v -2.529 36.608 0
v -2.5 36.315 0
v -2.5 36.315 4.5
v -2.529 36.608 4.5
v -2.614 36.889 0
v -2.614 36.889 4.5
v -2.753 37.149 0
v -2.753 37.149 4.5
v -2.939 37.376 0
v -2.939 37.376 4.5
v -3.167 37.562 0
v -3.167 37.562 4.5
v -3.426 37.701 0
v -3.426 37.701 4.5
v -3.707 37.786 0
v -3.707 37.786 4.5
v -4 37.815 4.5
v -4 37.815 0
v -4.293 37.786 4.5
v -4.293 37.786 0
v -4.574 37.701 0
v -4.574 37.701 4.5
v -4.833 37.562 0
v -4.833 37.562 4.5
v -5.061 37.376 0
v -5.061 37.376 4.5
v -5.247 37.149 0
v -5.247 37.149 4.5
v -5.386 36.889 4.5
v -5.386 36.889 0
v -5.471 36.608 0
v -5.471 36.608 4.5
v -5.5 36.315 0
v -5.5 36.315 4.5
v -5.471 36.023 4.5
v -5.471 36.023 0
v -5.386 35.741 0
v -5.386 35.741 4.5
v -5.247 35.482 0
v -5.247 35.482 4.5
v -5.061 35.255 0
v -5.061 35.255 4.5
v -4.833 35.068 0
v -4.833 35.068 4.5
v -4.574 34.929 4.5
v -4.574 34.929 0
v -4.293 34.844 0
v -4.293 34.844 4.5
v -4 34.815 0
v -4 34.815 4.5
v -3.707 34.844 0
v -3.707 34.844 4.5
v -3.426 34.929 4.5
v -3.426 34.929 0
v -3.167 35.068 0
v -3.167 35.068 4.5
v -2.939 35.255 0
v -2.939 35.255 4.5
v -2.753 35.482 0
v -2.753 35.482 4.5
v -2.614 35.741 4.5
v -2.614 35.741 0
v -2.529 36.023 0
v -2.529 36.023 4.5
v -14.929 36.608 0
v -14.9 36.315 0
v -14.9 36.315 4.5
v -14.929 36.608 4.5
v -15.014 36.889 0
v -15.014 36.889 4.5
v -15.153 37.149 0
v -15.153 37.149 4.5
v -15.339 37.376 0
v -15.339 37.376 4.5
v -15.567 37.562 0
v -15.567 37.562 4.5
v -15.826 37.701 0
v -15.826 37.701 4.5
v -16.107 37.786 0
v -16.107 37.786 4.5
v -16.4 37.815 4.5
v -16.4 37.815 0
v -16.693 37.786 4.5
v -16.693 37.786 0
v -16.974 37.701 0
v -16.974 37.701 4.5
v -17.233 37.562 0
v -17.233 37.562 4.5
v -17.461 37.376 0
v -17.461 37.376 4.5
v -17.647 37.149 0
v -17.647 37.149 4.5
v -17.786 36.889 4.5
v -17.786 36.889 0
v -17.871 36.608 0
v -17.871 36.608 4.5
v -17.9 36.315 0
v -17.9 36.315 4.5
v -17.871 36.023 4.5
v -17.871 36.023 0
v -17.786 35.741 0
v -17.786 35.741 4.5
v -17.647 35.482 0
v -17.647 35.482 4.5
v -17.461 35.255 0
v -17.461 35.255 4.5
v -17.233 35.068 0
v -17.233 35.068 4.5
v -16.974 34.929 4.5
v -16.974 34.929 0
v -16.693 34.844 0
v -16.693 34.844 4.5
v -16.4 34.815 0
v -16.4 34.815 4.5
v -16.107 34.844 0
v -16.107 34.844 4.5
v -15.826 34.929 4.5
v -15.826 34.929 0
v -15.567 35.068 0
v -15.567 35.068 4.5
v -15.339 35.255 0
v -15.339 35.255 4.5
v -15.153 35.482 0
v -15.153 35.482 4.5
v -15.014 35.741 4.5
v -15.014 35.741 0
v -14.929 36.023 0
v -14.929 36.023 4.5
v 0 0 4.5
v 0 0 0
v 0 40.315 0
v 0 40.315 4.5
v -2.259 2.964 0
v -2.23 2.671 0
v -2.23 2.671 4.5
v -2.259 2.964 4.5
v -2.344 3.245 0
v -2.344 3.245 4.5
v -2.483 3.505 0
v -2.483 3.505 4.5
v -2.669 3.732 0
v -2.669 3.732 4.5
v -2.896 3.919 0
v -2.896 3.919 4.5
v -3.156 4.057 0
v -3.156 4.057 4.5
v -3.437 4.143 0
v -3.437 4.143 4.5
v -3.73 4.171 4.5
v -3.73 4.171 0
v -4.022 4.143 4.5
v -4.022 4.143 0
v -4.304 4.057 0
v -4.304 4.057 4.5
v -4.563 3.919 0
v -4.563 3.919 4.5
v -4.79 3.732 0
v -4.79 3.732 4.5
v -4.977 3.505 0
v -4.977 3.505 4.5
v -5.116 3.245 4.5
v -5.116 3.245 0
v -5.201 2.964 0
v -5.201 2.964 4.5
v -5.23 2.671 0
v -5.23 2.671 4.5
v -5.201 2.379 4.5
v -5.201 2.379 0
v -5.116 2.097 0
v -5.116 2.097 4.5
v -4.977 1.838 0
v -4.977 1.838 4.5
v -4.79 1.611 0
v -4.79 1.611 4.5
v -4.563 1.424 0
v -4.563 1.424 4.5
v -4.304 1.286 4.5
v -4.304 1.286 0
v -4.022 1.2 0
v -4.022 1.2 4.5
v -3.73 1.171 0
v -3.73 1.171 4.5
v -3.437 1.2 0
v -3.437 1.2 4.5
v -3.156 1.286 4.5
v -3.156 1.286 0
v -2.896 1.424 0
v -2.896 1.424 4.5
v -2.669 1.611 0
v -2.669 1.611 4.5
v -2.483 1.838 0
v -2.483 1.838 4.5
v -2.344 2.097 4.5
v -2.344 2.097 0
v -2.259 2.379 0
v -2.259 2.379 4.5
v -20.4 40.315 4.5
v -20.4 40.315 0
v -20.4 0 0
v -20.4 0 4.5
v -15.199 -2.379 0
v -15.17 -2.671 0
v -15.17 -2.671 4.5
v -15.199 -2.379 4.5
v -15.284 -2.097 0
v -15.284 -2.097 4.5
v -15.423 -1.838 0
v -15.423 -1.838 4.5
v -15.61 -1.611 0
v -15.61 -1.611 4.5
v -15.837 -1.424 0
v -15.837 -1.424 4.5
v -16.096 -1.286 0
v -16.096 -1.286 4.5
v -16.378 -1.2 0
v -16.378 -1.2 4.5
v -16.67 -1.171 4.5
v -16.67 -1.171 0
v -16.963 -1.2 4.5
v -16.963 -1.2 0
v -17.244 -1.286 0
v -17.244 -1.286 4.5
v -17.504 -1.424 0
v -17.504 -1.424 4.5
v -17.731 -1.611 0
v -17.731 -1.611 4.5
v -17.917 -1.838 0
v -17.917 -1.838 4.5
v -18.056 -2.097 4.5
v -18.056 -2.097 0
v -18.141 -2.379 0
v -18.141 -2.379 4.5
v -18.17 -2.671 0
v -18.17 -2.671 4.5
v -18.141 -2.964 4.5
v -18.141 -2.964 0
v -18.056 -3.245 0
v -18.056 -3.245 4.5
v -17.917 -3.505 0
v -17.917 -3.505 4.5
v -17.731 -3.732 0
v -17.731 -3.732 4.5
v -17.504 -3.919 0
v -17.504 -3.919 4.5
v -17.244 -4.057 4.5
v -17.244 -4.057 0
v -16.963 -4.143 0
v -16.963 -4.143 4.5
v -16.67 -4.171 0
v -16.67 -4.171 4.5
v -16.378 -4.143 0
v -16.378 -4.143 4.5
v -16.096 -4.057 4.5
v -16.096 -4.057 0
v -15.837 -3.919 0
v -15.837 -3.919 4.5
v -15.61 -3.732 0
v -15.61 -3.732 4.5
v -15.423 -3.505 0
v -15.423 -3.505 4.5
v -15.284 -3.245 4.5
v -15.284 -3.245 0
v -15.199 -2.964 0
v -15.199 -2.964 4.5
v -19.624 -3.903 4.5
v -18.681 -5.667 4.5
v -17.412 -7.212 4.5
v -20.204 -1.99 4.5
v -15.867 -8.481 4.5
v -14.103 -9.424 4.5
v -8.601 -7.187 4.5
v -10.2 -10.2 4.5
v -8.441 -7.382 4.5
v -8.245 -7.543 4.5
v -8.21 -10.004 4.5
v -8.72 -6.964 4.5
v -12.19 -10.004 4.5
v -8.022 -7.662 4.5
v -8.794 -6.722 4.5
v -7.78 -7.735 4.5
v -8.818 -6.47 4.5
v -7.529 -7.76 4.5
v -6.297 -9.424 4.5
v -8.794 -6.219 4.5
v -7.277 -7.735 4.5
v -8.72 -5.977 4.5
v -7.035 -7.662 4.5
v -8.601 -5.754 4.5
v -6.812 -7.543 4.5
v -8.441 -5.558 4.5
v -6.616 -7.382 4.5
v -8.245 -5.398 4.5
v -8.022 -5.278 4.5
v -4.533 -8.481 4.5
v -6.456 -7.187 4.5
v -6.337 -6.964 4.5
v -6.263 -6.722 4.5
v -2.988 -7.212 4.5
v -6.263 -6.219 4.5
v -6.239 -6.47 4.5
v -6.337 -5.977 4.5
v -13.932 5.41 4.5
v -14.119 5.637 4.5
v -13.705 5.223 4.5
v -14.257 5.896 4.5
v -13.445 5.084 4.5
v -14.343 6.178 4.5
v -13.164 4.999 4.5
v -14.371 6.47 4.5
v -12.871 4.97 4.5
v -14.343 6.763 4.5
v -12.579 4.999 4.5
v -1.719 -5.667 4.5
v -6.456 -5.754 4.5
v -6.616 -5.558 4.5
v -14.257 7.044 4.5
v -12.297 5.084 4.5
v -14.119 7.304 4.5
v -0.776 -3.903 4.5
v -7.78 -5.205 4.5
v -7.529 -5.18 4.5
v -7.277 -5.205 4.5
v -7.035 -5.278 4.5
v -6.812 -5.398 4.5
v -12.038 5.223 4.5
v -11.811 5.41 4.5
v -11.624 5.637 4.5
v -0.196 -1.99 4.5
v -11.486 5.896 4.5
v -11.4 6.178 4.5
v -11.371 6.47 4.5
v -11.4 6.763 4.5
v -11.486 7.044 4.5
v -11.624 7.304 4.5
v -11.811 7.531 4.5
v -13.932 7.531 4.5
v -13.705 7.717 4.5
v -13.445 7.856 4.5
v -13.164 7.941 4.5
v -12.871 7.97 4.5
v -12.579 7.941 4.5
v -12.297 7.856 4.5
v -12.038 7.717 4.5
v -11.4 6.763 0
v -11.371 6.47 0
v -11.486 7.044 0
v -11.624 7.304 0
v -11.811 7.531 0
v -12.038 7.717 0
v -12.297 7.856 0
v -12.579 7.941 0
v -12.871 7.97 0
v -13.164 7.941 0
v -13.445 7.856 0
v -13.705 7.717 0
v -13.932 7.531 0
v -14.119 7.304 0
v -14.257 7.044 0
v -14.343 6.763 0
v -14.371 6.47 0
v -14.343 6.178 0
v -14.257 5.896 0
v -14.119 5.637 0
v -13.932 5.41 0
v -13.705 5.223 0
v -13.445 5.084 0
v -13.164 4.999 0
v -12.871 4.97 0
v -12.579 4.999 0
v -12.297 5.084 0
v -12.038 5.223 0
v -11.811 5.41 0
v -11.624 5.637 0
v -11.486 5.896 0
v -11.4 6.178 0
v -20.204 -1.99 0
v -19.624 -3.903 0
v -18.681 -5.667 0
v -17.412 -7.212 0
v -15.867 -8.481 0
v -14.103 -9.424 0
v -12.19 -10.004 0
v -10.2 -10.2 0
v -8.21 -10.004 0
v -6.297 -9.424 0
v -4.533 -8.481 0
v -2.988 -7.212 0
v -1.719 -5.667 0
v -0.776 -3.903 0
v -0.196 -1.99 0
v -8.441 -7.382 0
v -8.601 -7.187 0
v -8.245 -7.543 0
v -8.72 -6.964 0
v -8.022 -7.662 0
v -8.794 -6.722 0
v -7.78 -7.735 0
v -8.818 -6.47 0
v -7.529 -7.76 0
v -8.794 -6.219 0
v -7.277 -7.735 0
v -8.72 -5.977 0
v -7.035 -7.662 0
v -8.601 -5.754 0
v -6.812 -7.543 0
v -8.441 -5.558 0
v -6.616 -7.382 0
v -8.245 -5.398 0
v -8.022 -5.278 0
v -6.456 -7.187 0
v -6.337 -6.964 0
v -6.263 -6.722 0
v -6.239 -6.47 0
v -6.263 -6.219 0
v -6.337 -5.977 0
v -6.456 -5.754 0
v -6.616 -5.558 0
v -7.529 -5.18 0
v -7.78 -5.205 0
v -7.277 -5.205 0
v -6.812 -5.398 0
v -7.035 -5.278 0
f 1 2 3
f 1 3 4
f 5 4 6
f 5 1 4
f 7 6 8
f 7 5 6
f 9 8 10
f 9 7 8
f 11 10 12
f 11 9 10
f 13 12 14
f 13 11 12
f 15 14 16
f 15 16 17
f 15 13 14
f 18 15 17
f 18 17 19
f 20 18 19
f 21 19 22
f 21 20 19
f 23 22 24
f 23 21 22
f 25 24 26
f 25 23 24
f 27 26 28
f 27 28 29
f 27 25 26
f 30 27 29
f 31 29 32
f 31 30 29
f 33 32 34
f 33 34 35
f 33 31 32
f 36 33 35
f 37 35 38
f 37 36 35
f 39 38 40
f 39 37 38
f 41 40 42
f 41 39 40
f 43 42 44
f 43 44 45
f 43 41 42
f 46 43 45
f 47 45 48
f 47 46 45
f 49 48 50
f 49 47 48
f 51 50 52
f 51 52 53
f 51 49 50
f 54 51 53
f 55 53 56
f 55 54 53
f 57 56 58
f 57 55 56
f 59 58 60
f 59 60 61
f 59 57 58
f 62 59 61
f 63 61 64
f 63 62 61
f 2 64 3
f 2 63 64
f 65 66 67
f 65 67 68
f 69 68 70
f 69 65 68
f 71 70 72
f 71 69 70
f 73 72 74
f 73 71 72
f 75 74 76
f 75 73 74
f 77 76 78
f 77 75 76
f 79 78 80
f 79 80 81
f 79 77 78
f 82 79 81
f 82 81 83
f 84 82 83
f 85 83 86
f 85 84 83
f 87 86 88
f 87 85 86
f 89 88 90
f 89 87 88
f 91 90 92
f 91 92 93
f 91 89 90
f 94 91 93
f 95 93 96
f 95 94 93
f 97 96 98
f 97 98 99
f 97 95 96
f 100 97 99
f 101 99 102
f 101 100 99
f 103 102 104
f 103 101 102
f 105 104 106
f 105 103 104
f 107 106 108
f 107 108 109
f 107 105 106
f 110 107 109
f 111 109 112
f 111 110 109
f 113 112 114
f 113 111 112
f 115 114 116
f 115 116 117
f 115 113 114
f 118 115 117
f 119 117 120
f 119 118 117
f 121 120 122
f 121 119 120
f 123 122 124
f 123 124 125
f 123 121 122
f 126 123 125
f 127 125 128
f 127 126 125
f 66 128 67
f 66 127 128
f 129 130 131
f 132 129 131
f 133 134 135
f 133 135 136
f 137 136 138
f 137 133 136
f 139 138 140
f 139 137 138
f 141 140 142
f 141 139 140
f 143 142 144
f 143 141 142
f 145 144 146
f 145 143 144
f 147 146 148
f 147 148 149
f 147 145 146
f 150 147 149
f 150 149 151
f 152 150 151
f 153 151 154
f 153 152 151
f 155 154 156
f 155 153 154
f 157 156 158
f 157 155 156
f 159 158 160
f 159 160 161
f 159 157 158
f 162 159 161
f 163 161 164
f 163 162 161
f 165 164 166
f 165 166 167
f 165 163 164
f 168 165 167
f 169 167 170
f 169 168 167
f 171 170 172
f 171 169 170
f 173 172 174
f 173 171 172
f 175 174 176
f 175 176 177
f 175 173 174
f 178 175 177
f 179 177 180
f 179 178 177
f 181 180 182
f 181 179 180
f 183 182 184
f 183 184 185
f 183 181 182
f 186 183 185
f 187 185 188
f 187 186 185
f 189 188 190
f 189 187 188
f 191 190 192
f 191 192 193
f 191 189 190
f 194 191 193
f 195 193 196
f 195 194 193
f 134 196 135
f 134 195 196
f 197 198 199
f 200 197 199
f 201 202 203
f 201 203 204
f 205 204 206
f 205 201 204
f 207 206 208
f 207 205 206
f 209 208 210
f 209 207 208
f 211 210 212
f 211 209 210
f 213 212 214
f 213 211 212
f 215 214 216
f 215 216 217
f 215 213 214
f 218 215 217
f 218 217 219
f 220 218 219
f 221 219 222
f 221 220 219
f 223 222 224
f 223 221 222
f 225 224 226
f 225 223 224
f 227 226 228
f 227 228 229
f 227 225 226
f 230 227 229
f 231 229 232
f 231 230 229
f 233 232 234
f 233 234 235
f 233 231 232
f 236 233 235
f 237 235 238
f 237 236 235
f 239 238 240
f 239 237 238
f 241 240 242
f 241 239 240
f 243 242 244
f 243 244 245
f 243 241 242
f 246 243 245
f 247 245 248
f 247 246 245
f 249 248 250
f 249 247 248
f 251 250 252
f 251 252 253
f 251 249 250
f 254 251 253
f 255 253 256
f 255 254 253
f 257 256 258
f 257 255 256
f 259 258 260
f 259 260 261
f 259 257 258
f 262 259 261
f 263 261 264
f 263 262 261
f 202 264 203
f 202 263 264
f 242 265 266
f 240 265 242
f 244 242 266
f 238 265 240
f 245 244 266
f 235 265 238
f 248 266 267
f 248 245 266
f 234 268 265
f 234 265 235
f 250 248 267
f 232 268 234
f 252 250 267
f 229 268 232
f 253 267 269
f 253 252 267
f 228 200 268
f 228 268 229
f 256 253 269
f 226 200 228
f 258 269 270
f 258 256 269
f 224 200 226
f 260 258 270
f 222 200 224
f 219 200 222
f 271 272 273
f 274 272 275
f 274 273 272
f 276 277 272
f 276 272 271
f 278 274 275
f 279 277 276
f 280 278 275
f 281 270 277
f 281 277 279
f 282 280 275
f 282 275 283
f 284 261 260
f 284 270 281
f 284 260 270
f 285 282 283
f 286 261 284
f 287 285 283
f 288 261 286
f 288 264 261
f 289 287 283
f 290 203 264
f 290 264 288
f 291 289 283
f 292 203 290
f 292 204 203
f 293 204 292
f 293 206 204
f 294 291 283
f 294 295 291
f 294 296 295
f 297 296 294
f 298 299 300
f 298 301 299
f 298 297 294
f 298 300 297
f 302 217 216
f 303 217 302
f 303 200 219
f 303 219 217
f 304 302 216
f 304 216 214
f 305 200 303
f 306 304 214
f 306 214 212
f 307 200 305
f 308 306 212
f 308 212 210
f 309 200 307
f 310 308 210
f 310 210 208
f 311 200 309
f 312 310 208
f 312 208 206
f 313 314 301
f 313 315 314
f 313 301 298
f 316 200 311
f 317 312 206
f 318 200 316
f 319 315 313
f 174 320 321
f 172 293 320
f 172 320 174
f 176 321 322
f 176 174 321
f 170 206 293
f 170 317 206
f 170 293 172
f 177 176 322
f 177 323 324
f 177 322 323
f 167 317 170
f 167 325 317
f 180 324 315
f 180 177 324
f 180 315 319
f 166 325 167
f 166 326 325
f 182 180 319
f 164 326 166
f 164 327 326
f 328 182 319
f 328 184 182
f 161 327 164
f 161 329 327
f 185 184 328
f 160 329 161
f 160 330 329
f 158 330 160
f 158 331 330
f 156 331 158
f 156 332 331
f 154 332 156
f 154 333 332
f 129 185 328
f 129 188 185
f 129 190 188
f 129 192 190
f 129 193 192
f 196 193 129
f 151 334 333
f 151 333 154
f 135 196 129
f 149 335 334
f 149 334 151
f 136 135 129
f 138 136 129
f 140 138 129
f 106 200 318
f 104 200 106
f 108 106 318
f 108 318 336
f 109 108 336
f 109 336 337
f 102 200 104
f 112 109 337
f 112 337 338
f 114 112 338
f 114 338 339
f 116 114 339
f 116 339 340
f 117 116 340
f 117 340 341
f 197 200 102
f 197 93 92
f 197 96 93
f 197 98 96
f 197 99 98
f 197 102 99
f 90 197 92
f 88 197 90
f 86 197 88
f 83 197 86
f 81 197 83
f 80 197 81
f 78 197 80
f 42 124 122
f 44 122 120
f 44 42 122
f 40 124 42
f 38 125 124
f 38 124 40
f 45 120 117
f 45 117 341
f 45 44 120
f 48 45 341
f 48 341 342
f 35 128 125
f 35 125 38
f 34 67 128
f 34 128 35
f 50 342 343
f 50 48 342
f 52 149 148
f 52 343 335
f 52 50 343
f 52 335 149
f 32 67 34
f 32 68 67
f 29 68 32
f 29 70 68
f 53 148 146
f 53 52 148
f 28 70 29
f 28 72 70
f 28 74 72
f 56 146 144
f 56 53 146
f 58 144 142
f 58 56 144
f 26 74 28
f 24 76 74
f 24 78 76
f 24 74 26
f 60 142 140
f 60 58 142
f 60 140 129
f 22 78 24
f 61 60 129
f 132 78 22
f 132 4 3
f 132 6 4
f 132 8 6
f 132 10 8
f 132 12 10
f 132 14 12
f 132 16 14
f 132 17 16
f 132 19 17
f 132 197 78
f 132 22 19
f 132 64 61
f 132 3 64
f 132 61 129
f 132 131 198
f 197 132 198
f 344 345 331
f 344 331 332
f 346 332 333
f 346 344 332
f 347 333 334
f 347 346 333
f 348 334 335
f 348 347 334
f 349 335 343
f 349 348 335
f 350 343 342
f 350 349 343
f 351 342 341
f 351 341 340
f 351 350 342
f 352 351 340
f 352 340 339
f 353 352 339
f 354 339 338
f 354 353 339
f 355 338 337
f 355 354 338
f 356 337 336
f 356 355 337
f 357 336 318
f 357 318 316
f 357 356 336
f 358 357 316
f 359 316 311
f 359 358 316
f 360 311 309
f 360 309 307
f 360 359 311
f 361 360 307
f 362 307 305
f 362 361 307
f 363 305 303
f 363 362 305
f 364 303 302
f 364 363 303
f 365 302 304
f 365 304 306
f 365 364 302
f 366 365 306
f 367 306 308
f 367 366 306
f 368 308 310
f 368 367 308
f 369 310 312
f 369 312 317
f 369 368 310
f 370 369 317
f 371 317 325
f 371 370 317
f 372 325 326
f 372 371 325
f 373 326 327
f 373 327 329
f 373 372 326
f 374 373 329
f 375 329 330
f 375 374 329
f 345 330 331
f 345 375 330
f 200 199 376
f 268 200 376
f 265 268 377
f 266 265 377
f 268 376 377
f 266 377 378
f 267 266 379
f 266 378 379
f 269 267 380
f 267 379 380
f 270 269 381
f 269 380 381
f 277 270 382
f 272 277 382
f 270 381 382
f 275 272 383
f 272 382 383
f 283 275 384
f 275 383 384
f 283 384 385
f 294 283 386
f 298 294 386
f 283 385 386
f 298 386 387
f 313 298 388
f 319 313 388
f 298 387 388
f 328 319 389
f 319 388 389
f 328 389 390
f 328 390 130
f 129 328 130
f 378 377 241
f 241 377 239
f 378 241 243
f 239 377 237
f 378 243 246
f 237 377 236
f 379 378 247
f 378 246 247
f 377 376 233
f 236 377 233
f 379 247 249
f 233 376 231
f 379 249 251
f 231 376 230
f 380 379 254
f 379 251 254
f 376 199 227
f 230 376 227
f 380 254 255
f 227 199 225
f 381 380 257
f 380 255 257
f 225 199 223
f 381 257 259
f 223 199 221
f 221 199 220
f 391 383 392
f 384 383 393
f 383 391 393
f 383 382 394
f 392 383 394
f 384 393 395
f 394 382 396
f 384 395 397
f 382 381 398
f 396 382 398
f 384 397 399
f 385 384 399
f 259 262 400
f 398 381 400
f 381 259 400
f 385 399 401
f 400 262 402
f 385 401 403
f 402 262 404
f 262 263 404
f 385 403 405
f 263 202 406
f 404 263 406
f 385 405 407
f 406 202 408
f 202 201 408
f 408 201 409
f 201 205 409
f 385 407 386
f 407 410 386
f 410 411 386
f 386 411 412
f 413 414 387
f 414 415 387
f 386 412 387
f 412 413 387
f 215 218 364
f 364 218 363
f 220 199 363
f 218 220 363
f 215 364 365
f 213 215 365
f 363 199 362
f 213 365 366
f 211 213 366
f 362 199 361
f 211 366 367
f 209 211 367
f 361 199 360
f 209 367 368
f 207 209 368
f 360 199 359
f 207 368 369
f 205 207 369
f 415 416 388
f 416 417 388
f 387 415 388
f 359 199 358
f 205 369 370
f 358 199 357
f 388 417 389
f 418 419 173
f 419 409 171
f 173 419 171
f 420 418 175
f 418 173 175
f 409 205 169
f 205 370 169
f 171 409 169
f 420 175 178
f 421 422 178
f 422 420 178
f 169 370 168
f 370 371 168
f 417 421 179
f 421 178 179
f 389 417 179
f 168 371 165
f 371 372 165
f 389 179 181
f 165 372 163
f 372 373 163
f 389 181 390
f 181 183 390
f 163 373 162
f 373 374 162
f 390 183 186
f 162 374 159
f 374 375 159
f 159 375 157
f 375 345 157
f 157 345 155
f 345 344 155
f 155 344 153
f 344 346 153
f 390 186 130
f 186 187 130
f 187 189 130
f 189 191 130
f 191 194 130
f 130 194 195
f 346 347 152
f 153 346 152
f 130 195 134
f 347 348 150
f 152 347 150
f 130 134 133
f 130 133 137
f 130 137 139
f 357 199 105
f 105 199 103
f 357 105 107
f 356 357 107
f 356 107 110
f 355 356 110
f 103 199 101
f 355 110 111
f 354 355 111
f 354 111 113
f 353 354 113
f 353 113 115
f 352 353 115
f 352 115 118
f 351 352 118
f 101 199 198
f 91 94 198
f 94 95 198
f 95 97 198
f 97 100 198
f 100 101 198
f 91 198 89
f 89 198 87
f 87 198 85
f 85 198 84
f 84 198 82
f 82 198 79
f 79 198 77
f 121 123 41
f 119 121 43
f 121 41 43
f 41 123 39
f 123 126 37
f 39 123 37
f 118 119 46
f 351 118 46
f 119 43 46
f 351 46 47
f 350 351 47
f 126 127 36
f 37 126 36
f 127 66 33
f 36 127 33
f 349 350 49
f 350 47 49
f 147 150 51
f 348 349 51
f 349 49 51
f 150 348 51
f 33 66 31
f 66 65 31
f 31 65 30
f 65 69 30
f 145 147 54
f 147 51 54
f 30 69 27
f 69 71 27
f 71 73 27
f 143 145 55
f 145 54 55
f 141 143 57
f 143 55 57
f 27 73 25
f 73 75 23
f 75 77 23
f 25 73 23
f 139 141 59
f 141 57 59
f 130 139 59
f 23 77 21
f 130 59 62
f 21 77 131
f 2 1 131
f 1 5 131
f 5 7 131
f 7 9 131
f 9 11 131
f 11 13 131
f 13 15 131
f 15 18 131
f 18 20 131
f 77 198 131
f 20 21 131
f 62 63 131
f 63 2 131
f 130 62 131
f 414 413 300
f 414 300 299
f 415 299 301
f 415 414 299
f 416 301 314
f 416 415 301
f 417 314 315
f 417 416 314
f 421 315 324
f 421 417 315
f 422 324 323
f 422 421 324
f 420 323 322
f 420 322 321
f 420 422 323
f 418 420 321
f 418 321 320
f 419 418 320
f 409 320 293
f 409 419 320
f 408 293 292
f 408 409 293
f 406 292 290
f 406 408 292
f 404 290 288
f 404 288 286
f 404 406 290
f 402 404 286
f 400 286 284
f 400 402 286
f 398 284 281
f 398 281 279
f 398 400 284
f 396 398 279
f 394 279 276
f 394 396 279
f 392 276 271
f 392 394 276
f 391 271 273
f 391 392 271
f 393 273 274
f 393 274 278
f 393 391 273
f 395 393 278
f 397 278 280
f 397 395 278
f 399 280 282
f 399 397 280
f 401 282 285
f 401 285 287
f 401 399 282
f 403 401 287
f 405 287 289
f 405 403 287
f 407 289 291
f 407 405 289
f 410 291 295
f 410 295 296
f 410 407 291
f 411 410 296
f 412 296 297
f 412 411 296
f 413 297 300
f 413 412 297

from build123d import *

# Parameters (mm, degrees)
SKETCH1_R           = 1.5
SKETCH1_R_2         = 1.289902994
BOSS_EXTRUDE1_DEPTH = 4.5


with BuildPart() as part:
    # Sketch1 → Boss-Extrude1 (new body)
    # profile 1 of 3: a face of its own
    with BuildSketch(Plane.XY):
        with BuildLine():
            ThreePointArc((-20.4, 0), (-10.2, 10.2), (0, 0))
            Line((0, 0), (0, 40.315274694))
            Line((0, 40.315274694), (-20.4, 40.315274694))
            Line((-20.4, 40.315274694), (-20.4, 0))
        make_face()
        with Locations((-16.4, 36.315274694)):
            Circle(SKETCH1_R, mode=Mode.SUBTRACT)
        with Locations((-4, 36.315274694)):
            Circle(SKETCH1_R, mode=Mode.SUBTRACT)
    # profile 2 of 3: a face of its own
    with BuildSketch(Plane.XY):
        with BuildLine():
            ThreePointArc((-20.4, 0), (-10.2, -10.2), (0, 0))
            Line((0, 0), (-20.4, 0))
        make_face()
        with Locations((-16.670203746, -2.671416008)):
            Circle(SKETCH1_R, mode=Mode.SUBTRACT)
        with Locations((-7.528583992, -6.470203746)):
            Circle(SKETCH1_R_2, mode=Mode.SUBTRACT)
    # profile 3 of 3: a face of its own
    with BuildSketch(Plane.XY):
        with BuildLine():
            Line((-20.4, 0), (0, 0))
            ThreePointArc((0, 0), (-10.2, 10.2), (-20.4, 0))
        make_face()
        with Locations((-12.871416008, 6.470203746)):
            Circle(SKETCH1_R, mode=Mode.SUBTRACT)
        with Locations((-3.729796254, 2.671416008)):
            Circle(SKETCH1_R, mode=Mode.SUBTRACT)
    extrude(amount=BOSS_EXTRUDE1_DEPTH)


solid = part.part
